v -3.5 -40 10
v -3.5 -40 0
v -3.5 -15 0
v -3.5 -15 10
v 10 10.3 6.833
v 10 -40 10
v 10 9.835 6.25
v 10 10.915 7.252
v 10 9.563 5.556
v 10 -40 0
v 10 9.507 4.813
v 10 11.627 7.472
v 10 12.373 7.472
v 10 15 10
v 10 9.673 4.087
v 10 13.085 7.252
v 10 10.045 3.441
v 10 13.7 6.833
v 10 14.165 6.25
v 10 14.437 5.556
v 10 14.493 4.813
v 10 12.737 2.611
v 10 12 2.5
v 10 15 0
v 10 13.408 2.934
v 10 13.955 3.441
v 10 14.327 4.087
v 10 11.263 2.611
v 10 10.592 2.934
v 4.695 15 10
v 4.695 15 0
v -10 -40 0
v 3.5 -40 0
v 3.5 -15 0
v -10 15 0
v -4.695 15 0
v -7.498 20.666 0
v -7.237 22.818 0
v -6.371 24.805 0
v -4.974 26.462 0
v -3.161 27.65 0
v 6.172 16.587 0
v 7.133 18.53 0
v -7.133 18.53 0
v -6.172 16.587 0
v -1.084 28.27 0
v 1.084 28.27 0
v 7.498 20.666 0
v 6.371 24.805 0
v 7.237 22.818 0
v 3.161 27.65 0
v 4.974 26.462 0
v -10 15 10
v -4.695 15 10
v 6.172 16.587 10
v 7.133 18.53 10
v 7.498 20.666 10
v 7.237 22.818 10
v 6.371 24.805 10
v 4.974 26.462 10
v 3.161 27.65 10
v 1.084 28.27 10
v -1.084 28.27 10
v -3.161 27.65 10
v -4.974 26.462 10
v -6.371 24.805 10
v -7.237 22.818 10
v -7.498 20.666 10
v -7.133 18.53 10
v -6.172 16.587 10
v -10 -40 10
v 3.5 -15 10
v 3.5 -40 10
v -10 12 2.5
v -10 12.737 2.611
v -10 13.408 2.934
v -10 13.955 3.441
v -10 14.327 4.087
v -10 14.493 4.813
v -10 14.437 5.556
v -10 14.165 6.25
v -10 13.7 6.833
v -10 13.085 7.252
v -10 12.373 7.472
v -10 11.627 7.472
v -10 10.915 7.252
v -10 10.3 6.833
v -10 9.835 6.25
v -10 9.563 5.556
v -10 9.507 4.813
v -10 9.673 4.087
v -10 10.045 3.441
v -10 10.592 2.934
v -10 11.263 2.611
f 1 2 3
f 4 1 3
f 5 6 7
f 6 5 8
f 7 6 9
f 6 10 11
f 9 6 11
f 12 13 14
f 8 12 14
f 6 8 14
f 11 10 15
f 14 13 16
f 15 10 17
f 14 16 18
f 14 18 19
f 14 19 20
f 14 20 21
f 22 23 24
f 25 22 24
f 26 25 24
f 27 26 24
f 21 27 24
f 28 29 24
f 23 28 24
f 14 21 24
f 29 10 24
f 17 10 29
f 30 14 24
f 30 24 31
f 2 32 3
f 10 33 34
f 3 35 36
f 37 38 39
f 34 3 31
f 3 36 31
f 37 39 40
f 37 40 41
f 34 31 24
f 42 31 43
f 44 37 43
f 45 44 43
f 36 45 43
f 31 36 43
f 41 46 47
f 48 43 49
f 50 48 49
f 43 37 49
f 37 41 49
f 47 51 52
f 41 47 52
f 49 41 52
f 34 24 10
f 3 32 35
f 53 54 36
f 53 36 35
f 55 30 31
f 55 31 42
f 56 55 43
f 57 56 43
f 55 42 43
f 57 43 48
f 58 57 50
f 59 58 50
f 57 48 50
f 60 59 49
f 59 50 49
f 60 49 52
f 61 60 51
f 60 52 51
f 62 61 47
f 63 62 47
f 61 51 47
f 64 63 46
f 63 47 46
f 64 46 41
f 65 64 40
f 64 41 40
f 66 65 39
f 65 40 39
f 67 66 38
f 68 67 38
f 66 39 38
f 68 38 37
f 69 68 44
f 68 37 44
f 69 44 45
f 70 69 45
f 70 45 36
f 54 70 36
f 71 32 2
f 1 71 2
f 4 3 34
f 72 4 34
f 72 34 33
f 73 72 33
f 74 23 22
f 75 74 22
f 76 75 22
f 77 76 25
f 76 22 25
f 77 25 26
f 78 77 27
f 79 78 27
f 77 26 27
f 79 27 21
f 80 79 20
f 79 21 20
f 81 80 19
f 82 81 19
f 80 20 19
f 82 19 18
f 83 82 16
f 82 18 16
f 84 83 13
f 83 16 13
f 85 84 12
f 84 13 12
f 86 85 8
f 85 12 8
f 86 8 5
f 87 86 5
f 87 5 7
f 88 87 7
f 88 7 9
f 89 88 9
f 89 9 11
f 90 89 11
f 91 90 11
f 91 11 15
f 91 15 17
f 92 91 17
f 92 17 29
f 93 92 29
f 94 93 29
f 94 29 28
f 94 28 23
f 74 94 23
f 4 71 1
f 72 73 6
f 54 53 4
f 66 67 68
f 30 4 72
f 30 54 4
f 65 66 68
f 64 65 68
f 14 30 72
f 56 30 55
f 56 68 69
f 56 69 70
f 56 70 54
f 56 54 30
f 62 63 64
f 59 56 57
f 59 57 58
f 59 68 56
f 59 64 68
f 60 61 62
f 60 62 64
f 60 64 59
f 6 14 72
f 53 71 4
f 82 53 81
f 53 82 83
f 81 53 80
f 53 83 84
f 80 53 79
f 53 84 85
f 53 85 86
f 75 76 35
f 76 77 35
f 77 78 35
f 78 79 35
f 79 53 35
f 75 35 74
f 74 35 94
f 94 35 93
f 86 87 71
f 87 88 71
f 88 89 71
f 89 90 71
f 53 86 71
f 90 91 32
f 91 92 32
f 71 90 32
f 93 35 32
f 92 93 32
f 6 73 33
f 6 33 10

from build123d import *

# Parameters (mm, degrees)
SALIENTE_EXTRUIR1_DEPTH = 10
CROQUIS2_R              = 2.5
CORTAR_EXTRUIR1_DEPTH   = 21


with BuildPart() as part:
    # Croquis1 → Saliente-Extruir1 (new body)
    with BuildSketch(Plane.XY):
        with BuildLine():
            Line((-10, -15), (-10, -40))
            Line((-10, -40), (-3.5, -40))
            Line((-3.5, -40), (-3.5, -15))
            Line((-3.5, -15), (3.5, -15))
            Line((3.5, -15), (3.5, -40))
            Line((3.5, -40), (10, -40))
            Line((10, -40), (10, -15))
            Line((10, -15), (10, 15))
            Line((10, 15), (4.695324154, 15))
            ThreePointArc((4.695324154, 15), (0, 28.348412698), (-4.695324154, 15))
            Line((-4.695324154, 15), (-10, 15))
            Line((-10, 15), (-10, -15))
        make_face()
    extrude(amount=SALIENTE_EXTRUIR1_DEPTH)

    # Croquis2 → Cortar-Extruir1 (cut)
    with BuildSketch(Plane(origin=(10, 0, 0), x_dir=(0, 0, -1), z_dir=(1, 0, 0))):
        with Locations((-5, 12)):
            Circle(CROQUIS2_R)
    extrude(amount=-CORTAR_EXTRUIR1_DEPTH, mode=Mode.SUBTRACT)


solid = part.part
